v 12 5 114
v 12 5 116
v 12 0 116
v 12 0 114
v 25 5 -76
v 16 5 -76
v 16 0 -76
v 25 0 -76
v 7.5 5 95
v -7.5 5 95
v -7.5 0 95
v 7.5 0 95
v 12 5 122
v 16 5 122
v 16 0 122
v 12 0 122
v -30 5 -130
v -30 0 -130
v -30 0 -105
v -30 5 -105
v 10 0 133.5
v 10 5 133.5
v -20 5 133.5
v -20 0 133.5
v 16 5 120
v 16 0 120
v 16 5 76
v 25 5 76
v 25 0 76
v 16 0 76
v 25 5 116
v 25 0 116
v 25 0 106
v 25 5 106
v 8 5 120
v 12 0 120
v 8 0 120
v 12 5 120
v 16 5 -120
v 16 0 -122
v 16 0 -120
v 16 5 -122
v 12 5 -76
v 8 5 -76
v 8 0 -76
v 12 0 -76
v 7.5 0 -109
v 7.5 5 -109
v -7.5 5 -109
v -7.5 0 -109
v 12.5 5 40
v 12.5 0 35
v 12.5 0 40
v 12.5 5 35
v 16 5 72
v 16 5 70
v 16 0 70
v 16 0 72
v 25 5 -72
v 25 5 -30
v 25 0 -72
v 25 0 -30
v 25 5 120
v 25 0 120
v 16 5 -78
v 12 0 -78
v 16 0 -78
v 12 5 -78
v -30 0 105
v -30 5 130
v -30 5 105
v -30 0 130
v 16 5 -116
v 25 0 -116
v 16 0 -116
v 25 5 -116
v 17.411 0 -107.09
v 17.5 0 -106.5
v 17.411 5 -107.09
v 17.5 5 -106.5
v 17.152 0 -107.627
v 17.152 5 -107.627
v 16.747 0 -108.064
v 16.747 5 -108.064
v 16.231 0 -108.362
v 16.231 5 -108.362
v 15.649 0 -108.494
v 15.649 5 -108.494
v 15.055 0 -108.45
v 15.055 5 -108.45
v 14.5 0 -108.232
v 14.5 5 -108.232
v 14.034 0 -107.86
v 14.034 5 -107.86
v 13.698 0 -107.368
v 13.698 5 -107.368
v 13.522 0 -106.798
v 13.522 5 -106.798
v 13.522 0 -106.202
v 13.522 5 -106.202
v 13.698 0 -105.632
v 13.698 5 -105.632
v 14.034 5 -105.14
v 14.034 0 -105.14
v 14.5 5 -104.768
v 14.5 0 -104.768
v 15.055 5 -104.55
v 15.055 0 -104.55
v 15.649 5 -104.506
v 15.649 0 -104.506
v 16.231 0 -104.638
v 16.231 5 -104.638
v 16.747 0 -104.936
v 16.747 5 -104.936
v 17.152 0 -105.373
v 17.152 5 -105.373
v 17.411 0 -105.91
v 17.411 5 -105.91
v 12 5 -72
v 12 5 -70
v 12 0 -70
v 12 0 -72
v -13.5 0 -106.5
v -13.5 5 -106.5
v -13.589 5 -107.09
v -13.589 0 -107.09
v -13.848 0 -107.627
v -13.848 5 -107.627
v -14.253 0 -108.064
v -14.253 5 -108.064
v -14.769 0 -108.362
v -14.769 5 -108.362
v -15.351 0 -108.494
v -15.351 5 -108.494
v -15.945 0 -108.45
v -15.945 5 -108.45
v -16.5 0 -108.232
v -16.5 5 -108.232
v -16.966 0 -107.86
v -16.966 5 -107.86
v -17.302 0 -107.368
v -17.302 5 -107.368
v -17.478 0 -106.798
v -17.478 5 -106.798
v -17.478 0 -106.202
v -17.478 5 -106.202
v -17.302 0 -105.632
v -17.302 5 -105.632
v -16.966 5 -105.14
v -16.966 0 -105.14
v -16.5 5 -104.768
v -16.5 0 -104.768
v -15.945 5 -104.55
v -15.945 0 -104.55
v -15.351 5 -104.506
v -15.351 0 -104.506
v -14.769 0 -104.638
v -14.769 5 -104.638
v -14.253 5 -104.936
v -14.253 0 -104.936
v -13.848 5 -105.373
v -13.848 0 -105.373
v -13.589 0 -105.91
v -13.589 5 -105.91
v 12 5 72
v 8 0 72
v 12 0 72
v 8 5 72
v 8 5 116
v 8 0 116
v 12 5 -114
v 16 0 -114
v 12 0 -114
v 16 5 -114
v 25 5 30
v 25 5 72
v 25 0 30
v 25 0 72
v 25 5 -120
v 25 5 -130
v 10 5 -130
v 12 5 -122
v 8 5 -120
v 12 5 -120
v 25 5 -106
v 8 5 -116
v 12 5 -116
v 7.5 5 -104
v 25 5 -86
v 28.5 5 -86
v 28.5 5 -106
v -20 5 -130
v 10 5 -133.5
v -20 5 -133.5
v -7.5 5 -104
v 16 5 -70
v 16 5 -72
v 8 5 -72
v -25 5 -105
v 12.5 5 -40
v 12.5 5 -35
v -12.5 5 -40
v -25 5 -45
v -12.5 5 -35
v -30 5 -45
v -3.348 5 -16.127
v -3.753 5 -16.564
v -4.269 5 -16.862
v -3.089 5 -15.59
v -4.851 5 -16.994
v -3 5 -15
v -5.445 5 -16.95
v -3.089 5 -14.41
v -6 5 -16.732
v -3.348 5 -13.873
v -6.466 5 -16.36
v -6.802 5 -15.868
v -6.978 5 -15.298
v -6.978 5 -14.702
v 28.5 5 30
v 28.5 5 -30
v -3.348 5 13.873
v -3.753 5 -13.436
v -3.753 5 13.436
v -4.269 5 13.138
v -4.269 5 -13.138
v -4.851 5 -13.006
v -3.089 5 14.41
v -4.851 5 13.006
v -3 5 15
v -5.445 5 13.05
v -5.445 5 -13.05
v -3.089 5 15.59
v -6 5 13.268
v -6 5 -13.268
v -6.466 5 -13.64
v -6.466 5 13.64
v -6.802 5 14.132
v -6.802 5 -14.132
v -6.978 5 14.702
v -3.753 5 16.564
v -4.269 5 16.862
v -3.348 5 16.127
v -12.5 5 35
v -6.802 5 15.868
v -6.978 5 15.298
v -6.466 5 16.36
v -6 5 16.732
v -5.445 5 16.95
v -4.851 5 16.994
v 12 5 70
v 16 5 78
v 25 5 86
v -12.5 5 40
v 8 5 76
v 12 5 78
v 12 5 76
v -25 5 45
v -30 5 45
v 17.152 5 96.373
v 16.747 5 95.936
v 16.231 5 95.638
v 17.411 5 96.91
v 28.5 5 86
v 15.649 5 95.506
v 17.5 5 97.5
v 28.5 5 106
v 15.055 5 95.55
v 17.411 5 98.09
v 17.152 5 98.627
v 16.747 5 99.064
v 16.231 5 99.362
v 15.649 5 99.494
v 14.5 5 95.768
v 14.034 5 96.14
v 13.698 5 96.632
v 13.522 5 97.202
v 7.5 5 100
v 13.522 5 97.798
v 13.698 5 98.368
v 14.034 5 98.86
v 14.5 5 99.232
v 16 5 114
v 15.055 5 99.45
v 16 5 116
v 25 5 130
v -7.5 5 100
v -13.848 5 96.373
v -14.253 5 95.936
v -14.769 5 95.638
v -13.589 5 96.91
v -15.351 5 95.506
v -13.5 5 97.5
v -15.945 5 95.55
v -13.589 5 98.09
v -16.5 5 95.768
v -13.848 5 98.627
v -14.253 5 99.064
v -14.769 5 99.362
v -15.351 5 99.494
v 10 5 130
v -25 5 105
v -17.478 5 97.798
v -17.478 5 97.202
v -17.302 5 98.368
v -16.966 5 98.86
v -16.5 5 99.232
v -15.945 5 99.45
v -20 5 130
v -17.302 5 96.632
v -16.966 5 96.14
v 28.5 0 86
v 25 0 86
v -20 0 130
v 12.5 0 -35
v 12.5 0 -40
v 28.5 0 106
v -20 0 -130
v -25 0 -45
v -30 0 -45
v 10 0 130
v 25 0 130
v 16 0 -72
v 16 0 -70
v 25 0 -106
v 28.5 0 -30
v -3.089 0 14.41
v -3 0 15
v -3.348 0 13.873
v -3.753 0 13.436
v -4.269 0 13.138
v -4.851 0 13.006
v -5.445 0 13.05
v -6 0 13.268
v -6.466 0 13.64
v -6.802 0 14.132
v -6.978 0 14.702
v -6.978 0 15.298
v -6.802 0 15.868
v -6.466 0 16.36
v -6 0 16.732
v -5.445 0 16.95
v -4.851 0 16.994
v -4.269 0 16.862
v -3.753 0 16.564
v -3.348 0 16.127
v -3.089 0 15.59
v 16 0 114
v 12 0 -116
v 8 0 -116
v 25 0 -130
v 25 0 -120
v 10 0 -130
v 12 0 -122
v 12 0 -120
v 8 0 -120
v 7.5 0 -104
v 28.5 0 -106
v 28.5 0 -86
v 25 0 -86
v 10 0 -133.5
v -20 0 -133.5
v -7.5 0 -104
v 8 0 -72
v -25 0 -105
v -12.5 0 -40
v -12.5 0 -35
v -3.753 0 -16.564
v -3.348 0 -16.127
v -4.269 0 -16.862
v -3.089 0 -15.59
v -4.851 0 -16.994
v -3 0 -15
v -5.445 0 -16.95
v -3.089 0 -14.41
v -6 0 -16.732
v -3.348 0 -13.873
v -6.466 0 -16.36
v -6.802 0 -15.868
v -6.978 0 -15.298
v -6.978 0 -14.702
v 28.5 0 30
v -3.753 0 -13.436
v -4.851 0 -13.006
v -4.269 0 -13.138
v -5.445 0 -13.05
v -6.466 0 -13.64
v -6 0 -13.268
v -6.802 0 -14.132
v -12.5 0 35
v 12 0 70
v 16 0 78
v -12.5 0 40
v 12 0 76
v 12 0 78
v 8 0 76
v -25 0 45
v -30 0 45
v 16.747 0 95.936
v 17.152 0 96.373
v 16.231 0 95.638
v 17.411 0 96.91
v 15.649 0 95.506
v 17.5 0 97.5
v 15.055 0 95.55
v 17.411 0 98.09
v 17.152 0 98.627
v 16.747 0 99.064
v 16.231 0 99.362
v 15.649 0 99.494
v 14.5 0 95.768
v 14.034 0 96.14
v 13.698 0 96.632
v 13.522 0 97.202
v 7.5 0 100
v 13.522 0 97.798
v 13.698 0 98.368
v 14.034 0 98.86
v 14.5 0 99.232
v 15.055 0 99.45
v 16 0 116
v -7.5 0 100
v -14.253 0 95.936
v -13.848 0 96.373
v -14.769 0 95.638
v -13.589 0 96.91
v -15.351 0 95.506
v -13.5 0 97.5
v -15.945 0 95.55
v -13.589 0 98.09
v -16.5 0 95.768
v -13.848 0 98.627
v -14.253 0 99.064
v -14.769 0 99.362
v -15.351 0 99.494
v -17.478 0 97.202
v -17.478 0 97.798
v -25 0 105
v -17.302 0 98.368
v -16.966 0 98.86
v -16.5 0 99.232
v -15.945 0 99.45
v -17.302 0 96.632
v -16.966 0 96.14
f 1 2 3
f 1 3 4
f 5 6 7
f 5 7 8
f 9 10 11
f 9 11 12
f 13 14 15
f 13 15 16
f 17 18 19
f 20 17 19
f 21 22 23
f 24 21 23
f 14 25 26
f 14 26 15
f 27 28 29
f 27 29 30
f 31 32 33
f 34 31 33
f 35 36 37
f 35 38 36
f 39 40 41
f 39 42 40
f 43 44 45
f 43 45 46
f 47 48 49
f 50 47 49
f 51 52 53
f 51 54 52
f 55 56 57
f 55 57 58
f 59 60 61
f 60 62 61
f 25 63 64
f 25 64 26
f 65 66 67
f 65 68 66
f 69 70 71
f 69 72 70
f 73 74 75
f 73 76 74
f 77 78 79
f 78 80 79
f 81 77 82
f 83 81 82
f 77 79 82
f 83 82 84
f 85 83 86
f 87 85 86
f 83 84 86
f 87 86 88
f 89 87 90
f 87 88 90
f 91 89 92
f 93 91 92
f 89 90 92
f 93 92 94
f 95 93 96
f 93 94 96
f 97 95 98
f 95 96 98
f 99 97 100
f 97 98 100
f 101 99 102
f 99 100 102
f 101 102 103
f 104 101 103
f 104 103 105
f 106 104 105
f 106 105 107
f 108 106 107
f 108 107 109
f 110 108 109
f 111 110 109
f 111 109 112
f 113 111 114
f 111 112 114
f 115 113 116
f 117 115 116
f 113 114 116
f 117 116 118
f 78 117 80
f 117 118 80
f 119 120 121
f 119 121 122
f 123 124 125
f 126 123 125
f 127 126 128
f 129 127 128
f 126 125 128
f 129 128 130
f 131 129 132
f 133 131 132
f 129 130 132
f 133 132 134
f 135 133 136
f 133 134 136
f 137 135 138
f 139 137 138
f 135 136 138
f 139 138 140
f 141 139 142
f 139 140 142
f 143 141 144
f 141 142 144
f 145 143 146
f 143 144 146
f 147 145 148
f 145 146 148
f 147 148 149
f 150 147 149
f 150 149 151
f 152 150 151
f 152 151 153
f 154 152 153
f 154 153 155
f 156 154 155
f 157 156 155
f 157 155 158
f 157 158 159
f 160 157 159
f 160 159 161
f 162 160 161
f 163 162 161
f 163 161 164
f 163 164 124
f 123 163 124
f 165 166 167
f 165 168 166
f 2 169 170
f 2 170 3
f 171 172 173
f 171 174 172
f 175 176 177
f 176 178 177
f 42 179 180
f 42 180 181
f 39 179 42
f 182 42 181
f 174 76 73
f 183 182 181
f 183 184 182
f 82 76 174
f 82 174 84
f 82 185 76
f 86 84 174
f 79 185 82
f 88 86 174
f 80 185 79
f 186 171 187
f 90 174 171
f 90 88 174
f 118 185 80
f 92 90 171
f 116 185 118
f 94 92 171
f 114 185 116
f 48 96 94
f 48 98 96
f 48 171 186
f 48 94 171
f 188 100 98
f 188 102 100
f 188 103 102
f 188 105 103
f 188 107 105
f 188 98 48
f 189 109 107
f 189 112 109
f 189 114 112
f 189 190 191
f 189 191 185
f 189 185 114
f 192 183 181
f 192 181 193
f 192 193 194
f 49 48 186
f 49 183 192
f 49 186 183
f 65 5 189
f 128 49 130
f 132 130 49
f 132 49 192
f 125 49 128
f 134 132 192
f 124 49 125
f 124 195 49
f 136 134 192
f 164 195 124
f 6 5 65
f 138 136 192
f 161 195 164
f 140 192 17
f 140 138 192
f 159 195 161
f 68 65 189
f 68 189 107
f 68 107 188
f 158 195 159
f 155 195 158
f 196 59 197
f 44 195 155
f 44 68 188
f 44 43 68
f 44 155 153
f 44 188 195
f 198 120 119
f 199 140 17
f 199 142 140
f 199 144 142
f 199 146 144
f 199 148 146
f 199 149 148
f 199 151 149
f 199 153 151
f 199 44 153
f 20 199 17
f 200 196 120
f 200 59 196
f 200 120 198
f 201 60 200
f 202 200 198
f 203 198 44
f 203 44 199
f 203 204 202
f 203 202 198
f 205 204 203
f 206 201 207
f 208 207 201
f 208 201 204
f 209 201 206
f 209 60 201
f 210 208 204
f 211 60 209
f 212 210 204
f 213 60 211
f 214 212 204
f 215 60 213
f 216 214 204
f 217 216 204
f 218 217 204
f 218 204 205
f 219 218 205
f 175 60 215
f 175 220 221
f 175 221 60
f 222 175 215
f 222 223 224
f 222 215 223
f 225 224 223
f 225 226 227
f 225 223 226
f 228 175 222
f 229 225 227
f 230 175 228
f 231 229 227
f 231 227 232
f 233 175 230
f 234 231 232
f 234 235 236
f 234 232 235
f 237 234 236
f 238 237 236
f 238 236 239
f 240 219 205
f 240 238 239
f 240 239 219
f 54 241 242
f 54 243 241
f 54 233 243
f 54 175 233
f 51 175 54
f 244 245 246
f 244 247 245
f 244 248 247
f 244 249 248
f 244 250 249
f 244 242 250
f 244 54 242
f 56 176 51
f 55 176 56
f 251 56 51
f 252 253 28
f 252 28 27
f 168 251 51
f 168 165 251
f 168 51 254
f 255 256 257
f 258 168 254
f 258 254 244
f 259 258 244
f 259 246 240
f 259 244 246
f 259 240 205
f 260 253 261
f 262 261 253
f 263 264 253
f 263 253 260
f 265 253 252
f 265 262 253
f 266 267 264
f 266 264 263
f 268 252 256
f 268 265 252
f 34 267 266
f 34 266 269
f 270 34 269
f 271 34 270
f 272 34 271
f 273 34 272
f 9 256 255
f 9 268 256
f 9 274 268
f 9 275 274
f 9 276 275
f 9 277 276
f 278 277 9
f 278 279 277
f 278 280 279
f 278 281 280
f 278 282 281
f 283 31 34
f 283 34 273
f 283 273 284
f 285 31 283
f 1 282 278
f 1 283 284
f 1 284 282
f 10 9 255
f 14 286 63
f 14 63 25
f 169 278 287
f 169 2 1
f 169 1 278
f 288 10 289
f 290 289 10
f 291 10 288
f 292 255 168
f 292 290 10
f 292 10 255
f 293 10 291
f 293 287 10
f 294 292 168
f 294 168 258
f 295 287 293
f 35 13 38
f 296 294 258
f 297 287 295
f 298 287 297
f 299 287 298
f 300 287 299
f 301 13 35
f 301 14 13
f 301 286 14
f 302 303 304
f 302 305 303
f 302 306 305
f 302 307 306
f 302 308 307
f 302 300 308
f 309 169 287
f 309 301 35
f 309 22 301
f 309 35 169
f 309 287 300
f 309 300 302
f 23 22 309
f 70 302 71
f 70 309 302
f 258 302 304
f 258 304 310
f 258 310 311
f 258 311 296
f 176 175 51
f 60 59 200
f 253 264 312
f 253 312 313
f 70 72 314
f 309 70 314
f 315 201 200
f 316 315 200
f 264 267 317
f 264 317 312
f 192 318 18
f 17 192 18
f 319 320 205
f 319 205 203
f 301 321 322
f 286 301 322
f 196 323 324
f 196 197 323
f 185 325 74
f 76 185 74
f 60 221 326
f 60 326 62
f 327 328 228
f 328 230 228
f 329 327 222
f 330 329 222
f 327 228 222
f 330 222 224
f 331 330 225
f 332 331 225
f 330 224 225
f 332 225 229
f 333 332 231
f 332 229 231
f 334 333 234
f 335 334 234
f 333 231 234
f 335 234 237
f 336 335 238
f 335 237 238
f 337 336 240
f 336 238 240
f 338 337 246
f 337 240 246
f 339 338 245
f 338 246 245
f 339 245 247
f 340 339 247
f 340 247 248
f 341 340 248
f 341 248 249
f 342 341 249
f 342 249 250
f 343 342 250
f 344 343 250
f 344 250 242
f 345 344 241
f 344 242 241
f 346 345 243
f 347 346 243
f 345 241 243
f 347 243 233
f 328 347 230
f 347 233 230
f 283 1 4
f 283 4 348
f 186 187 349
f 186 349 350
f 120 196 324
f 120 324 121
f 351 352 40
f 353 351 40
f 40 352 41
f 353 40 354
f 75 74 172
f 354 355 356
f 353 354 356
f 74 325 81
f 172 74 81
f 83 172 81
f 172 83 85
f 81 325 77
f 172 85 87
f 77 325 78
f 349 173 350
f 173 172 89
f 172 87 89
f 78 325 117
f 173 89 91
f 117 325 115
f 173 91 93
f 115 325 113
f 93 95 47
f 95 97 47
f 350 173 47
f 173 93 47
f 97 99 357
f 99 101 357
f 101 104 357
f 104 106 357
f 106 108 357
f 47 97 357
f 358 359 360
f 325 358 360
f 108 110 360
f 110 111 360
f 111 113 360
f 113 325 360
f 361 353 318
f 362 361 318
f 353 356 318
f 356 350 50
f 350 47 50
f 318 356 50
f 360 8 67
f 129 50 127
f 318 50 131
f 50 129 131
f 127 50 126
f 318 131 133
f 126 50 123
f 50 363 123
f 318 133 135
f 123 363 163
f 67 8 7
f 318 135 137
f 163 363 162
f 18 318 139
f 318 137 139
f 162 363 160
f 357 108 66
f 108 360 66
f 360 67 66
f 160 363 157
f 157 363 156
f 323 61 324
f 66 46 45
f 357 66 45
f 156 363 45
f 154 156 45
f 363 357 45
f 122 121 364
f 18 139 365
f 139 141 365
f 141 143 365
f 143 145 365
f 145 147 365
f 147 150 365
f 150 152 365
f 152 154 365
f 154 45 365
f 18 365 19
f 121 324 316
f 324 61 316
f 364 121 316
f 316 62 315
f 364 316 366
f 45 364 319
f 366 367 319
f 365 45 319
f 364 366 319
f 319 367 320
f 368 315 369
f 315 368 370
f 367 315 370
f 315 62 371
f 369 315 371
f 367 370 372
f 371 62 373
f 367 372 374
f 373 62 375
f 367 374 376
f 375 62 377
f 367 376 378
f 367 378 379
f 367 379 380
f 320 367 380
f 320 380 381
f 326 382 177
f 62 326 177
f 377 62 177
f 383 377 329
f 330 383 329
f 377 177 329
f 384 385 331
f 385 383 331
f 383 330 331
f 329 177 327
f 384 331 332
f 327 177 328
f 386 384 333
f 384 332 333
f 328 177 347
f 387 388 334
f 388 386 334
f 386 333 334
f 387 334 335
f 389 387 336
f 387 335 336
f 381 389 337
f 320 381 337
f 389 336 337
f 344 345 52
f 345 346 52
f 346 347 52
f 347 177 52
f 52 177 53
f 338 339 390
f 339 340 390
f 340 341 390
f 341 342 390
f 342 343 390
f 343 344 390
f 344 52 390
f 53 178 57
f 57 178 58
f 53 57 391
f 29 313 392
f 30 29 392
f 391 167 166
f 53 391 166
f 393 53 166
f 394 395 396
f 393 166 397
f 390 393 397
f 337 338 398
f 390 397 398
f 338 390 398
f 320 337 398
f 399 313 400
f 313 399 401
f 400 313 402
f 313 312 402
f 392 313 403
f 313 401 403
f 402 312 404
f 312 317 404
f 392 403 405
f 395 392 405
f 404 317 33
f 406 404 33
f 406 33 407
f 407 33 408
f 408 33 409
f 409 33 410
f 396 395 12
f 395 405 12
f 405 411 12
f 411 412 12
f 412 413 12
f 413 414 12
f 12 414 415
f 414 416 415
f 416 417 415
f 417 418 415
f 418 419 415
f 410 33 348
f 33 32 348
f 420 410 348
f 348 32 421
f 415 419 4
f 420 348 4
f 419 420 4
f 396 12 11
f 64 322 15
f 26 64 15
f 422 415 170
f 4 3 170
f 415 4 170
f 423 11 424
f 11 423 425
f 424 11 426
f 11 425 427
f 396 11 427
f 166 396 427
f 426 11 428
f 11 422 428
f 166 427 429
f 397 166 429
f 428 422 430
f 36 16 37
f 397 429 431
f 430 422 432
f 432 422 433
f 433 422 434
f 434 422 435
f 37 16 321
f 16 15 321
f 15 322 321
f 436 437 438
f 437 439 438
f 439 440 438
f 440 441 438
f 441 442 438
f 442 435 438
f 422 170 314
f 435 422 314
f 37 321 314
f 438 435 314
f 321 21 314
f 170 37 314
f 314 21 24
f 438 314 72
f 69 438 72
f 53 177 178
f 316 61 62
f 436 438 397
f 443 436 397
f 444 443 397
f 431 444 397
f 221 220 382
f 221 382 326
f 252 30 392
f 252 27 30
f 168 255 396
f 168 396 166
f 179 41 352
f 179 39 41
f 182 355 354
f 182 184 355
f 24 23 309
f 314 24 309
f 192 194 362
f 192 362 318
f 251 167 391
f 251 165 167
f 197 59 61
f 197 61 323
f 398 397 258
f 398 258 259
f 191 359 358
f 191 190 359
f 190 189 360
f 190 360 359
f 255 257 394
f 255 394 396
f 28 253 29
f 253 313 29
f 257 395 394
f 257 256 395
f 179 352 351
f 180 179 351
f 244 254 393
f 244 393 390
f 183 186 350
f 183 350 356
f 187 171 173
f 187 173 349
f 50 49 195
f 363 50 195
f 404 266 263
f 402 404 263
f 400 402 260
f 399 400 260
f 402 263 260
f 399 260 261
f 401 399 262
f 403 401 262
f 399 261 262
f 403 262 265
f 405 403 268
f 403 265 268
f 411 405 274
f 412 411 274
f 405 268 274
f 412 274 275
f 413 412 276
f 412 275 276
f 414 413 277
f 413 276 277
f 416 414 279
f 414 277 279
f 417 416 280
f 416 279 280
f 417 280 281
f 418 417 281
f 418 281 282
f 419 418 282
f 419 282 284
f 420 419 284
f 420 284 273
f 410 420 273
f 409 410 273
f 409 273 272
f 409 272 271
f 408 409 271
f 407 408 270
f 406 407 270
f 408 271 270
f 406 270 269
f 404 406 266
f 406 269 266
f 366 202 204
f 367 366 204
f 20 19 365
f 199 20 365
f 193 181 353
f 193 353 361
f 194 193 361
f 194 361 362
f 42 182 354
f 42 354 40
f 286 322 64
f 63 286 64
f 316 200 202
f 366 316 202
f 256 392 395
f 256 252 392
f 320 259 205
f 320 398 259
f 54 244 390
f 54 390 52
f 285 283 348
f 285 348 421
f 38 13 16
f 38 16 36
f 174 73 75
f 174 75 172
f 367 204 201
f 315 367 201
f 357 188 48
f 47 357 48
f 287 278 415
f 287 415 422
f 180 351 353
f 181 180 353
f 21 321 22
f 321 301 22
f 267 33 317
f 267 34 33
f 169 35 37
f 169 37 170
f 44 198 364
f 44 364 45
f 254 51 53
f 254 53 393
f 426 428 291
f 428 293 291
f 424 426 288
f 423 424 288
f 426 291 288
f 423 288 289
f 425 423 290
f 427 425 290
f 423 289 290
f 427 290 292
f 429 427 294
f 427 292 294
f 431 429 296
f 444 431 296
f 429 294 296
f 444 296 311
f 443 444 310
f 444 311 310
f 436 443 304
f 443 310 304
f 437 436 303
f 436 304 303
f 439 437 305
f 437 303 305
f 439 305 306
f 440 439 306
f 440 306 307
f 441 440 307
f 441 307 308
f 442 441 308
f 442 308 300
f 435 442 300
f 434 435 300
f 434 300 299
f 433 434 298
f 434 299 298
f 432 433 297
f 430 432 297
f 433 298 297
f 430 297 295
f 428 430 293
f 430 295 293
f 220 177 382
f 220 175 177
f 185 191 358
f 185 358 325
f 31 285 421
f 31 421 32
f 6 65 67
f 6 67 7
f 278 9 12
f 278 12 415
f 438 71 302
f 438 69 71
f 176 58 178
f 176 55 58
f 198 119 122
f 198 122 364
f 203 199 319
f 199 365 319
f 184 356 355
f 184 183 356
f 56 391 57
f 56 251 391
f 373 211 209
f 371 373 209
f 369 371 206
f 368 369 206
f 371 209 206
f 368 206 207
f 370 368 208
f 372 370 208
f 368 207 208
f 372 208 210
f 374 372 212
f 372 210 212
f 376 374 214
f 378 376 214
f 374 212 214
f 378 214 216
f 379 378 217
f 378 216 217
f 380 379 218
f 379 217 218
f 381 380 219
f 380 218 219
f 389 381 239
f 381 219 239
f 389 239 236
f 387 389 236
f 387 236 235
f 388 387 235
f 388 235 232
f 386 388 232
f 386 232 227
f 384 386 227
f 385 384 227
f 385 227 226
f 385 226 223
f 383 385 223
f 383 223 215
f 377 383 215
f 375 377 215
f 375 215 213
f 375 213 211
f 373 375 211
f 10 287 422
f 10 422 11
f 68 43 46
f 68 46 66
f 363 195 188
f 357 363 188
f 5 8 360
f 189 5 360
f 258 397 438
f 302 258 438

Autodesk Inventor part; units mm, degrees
ref_plane "YZ Plane" through (0, 0, 0) normal (1, 0, 0) x (0, 1, 0)
ref_plane "XZ Plane" through (0, 0, 0) normal (0, 1, 0) x (-1, 0, 0)
ref_plane "XY Plane" through (0, 0, 0) normal (0, 0, 1) x (1, 0, 0)
sketch "Sketch1" plane through (0, 0, 0) normal (0, 1, 0) x (-1, 0, 0)
  line L0 (-25, -130) -> (25, -130)
  line L1 (25, 130) -> (-25, 130)
  line L2 (-25, 130) -> (-25, -130)
  line L3 (-25, -130) -> (25, 130) construction
  line L4 (25, -130) -> (-25, 130) construction
  line L5 (25, 130) -> (30, 130)
  line L6 (30, 130) -> (30, 105)
  line L7 (30, 105) -> (25, 105)
  line L8 (25, -130) -> (30, -130)
  line L9 (30, -130) -> (30, -105)
  line L10 (30, -105) -> (25, -105)
  line L11 (25, 105) -> (-25, 105) construction
  line L12 (3.2055, 0) -> (-25, 0) construction
  line L13 (25, -105) -> (-25, -105) construction
  line L14 (25, 45) -> (30, 45)
  line L15 (30, 45) -> (30, -45)
  line L16 (30, -45) -> (25, -45)
  line L17 (25, -105) -> (25, -45)
  line L18 (25, 45) -> (25, 105)
  point P0 (0, 0)
  dimension "d0" = 50
  dimension "d1" = 260
  dimension "d2" = 5
  dimension "d3" = 25
  dimension "d4" = 5
  dimension "d5" = 25
  dimension "d7" = 5
  dimension "d8" = 90
  dimension "d29" = 60
  dimension "d30" = 60
extrude "Extrusion1" add sketch "Sketch1" along normal blind 5
sketch "Sketch2" plane through (0, 5, 0) normal (0, 1, 0) x (1, 0, 0)
  line L0 (25, 130) -> (-30, 130) construction
  line L1 (-30, 130) -> (-30, 105) construction
  line L2 (-30, 105) -> (-25, 105) construction
  line L3 (-25, 105) -> (-25, 45) construction
  line L4 (-25, 45) -> (-30, 45) construction
  line L5 (-30, 45) -> (-30, -45) construction
  line L6 (-30, -45) -> (-25, -45) construction
  line L7 (-25, -45) -> (-25, -105) construction
  line L8 (-25, -105) -> (-30, -105) construction
  line L9 (-30, -105) -> (-30, -130) construction
  line L10 (-30, -130) -> (25, -130) construction
  line L11 (25, -130) -> (25, 130) construction
  line L12 (-30, 45) -> (-30, -45) construction
  line L13 (25, -130) -> (25, 130) construction
  line L14 (7.5, -100) -> (-7.5, -100)
  line L15 (-7.5, -100) -> (-7.5, -95)
  line L16 (-7.5, -95) -> (7.5, -95)
  line L17 (7.5, -95) -> (7.5, -100)
  line L18 (7.5, 109) -> (-7.5, 109)
  line L19 (-7.5, 109) -> (-7.5, 104)
  line L20 (-7.5, 104) -> (7.5, 104)
  line L21 (7.5, 104) -> (7.5, 109)
  line L22 (-7.5, 106.5) -> (25, 106.5) construction
  line L23 (-7.5, 106.5) -> (-30, 106.5) construction
  circle A0 centre (-15.5, 106.5) radius 2
  circle A1 centre (15.5, 106.5) radius 2
  line L24 (-7.5, -97.5) -> (25, -97.5) construction
  line L25 (-7.5, -97.5) -> (-25, -97.5) construction
  circle A2 centre (-15.5, -97.5) radius 2
  circle A3 centre (15.5, -97.5) radius 2
  point P0 (0, 0)
  dimension "d11" = 15
  dimension "d12" = 5
  dimension "d13" = 35
  dimension "d14" = 17.5
  dimension "d17" = 5
  dimension "d18" = 15
  dimension "d19" = 26
  dimension "d31" = 17.5
  dimension "d32" = 4
  dimension "d33" = 4
  dimension "d34" = 8
  dimension "d35" = 8
  dimension "d36" = 4
  dimension "d37" = 4
  dimension "d38" = 8
  dimension "d39" = 8
extrude "Extrusion2" cut sketch "Sketch2" against normal blind 5
sketch "Sketch3" plane through (0, 5, 0) normal (0, 1, 0) x (1, 0, 0)
  line L0 (7.5, -95) -> (7.5, -100) construction
  line L1 (7.5, -100) -> (-7.5, -100) construction
  line L2 (-7.5, -100) -> (-7.5, -95) construction
  line L3 (-7.5, -95) -> (7.5, -95) construction
  line L4 (7.5, 104) -> (-7.5, 104) construction
  line L5 (-7.5, 104) -> (-7.5, 109) construction
  line L6 (-7.5, 109) -> (7.5, 109) construction
  line L7 (7.5, 109) -> (7.5, 104) construction
  line L8 (25, 130) -> (-30, 130) construction
  line L9 (-30, 130) -> (-30, 105) construction
  line L10 (-30, 105) -> (-25, 105) construction
  line L11 (-25, 105) -> (-25, 45) construction
  line L12 (-25, 45) -> (-30, 45) construction
  line L13 (-30, 45) -> (-30, -45) construction
  line L14 (-30, -45) -> (-25, -45) construction
  line L15 (-25, -45) -> (-25, -105) construction
  line L16 (-25, -105) -> (-30, -105) construction
  line L17 (-30, -105) -> (-30, -130) construction
  line L18 (-30, -130) -> (25, -130) construction
  line L19 (25, -130) -> (25, 130) construction
  circle A0 centre (-5, 15) radius 2
  circle A1 centre (-5, -15) radius 2
  line L20 (-30, 45) -> (-30, -45) construction
  line L21 (-30, 0) -> (25, 0) construction
  point P0 (0, 0)
  dimension "d20" = 4
  dimension "d21" = 4
  dimension "d23" = 15
  dimension "d24" = 15
  dimension "d25" = 25
  dimension "d26" = 25
extrude "Extrusion3" cut sketch "Sketch3" against normal blind 5
sketch "Sketch4" plane through (0, 5, 0) normal (0, 1, 0) x (1, 0, 0)
  circle A0 centre (-5, 15) radius 2 construction
  circle A1 centre (-5, -15) radius 2 construction
  line L0 (7.5, -95) -> (7.5, -100) construction
  line L1 (7.5, -100) -> (-7.5, -100) construction
  line L2 (-7.5, -100) -> (-7.5, -95) construction
  line L3 (-7.5, -95) -> (7.5, -95) construction
  circle A2 centre (-15.5, -97.5) radius 2 construction
  circle A3 centre (-15.5, 106.5) radius 2 construction
  circle A4 centre (15.5, 106.5) radius 2 construction
  circle A5 centre (15.5, -97.5) radius 2 construction
  line L4 (7.5, 104) -> (-7.5, 104) construction
  line L5 (-7.5, 104) -> (-7.5, 109) construction
  line L6 (-7.5, 109) -> (7.5, 109) construction
  line L7 (7.5, 109) -> (7.5, 104) construction
  line L8 (25, 130) -> (-30, 130) construction
  line L9 (-30, 130) -> (-30, 105) construction
  line L10 (-30, 105) -> (-25, 105) construction
  line L11 (-25, 105) -> (-25, 45) construction
  line L12 (-25, 45) -> (-30, 45) construction
  line L13 (-30, 45) -> (-30, -45) construction
  line L14 (-30, -45) -> (-25, -45) construction
  line L15 (-25, -45) -> (-25, -105) construction
  line L16 (-25, -105) -> (-30, -105) construction
  line L17 (-30, -105) -> (-30, -130) construction
  line L18 (-30, -130) -> (25, -130) construction
  line L19 (25, -130) -> (25, 130) construction
  line L20 (0, 0) -> (0, -130) construction
  line L21 (-30, -130) -> (25, -130) construction
  line L22 (0, 0) -> (0, 130) construction
  line L23 (25, 130) -> (-30, 130) construction
  line L24 (25, 0) -> (-30, 0) construction
  line L25 (-30, 45) -> (-30, -45) construction
  line L26 (12.5, 40) -> (-12.5, 40)
  line L27 (-12.5, 40) -> (-12.5, 35)
  line L28 (-12.5, 35) -> (12.5, 35)
  line L29 (12.5, 35) -> (12.5, 40)
  line L30 (12.5, 40) -> (-12.5, 35) construction
  line L31 (-12.5, 40) -> (12.5, 35) construction
  line L32 (12.5, -40) -> (-12.5, -40)
  line L33 (-12.5, -40) -> (-12.5, -35)
  line L34 (-12.5, -35) -> (12.5, -35)
  line L35 (12.5, -35) -> (12.5, -40)
  line L36 (12.5, -40) -> (-12.5, -35) construction
  line L37 (-12.5, -40) -> (12.5, -35) construction
  point P0 (0, 37.5)
  point P1 (0, -37.5)
  dimension "d42" = 25
  dimension "d43" = 5
  dimension "d44" = 90
extrude "Extrusion4" cut sketch "Sketch4" against normal blind 10
sketch "Sketch5" plane through (0, 5, 0) normal (0, 1, 0) x (1, 0, 0)
  line L0 (-12.5, 35) -> (-12.5, 40) construction
  line L1 (-12.5, 40) -> (12.5, 40) construction
  line L2 (12.5, 40) -> (12.5, 35) construction
  line L3 (12.5, 35) -> (-12.5, 35) construction
  line L4 (12.5, -40) -> (-12.5, -40) construction
  line L5 (-12.5, -40) -> (-12.5, -35) construction
  line L6 (-12.5, -35) -> (12.5, -35) construction
  line L7 (12.5, -35) -> (12.5, -40) construction
  circle A0 centre (-5, 15) radius 2 construction
  circle A1 centre (-5, -15) radius 2 construction
  line L8 (7.5, -95) -> (7.5, -100) construction
  line L9 (7.5, -100) -> (-7.5, -100) construction
  line L10 (-7.5, -100) -> (-7.5, -95) construction
  line L11 (-7.5, -95) -> (7.5, -95) construction
  circle A2 centre (-15.5, -97.5) radius 2 construction
  circle A3 centre (-15.5, 106.5) radius 2 construction
  circle A4 centre (15.5, 106.5) radius 2 construction
  circle A5 centre (15.5, -97.5) radius 2 construction
  line L12 (7.5, 104) -> (-7.5, 104) construction
  line L13 (-7.5, 104) -> (-7.5, 109) construction
  line L14 (-7.5, 109) -> (7.5, 109) construction
  line L15 (7.5, 109) -> (7.5, 104) construction
  line L16 (25, 130) -> (-30, 130) construction
  line L17 (-30, 130) -> (-30, 105) construction
  line L18 (-30, 105) -> (-25, 105) construction
  line L19 (-25, 105) -> (-25, 45) construction
  line L20 (-25, 45) -> (-30, 45) construction
  line L21 (-30, 45) -> (-30, -45) construction
  line L22 (-30, -45) -> (-25, -45) construction
  line L23 (-25, -45) -> (-25, -105) construction
  line L24 (-25, -105) -> (-30, -105) construction
  line L25 (-30, -105) -> (-30, -130) construction
  line L26 (-30, -130) -> (25, -130) construction
  line L27 (25, -130) -> (25, 130) construction
  line L28 (0, -40) -> (0, -45) construction
  line L29 (0, -45) -> (-20, -45) construction
  line L30 (-20, -45) -> (-20, -40) construction
  line L31 (-20, -40) -> (0, -40) construction
  line L32 (0, 45) -> (0, 40) construction
  line L33 (0, 40) -> (-20, 40) construction
  line L34 (-20, 40) -> (-20, 45) construction
  line L35 (-20, 45) -> (0, 45) construction
  circle A6 centre (-30.5, 97.5) radius 2 construction
  circle A7 centre (-30.5, -106.5) radius 2 construction
  circle A8 centre (10.5, -106.5) radius 2 construction
  circle A9 centre (10.5, 97.5) radius 2 construction
  line L36 (-22.5, 95) -> (-22.5, 100) construction
  line L37 (-22.5, 100) -> (2.5, 100) construction
  line L38 (2.5, 100) -> (2.5, 95) construction
  line L39 (2.5, 95) -> (-22.5, 95) construction
  line L40 (2.5, -109) -> (-22.5, -109) construction
  line L41 (-22.5, -109) -> (-22.5, -104) construction
  line L42 (-22.5, -104) -> (2.5, -104) construction
  line L43 (2.5, -104) -> (2.5, -109) construction
  line L44 (-50, -130) -> (25, -130) construction
  line L45 (25, -130) -> (25, 130) construction
  line L46 (25, 130) -> (-50, 130) construction
  line L47 (-50, 130) -> (-50, 105) construction
  line L48 (-50, 105) -> (-45, 105) construction
  line L49 (-45, 105) -> (-45, 45) construction
  line L50 (-45, 45) -> (-50, 45) construction
  line L51 (-50, 45) -> (-50, -45) construction
  line L52 (-50, -45) -> (-45, -45) construction
  line L53 (-45, -45) -> (-45, -105) construction
  line L54 (-45, -105) -> (-50, -105) construction
  line L55 (-50, -105) -> (-50, -130) construction
  line L56 (25, -130) -> (25, 130) construction
  line L57 (25, -120) -> (10, -120) construction
  line L58 (10, -120) -> (10, -116) construction
  line L59 (10, -116) -> (25, -116) construction
  line L60 (25, -116) -> (25, -120) construction
  line L61 (10, -118) -> (25, -118) construction
  line L62 (18, -114) -> (14, -114) construction
  line L63 (14, -114) -> (14, -122) construction
  line L64 (14, -122) -> (18, -122) construction
  line L65 (18, -122) -> (18, -114) construction
  line L66 (18, -114) -> (14, -122) construction
  line L67 (14, -114) -> (18, -122) construction
  line L68 (25, -116) -> (25, -120)
  line L69 (25, -120) -> (18, -120)
  line L70 (18, -120) -> (18, -122)
  line L71 (18, -122) -> (14, -122)
  line L72 (14, -122) -> (14, -120)
  line L73 (14, -120) -> (10, -120)
  line L74 (10, -120) -> (10, -116)
  line L75 (10, -116) -> (14, -116)
  line L76 (14, -116) -> (14, -114)
  line L77 (14, -114) -> (18, -114)
  line L78 (18, -114) -> (18, -116)
  line L79 (18, -116) -> (25, -116)
  line L80 (18, -70) -> (14, -70) construction
  line L81 (14, -70) -> (18, -70)
  line L82 (18, -70) -> (18, -72)
  line L83 (10, -72) -> (25, -72) construction
  line L84 (10, -74) -> (25, -74) construction
  line L85 (25, -76) -> (10, -76) construction
  line L86 (18, -78) -> (18, -70) construction
  line L87 (18, -70) -> (14, -78) construction
  line L88 (14, -70) -> (18, -78) construction
  line L89 (14, -70) -> (14, -78) construction
  line L90 (14, -78) -> (18, -78) construction
  line L91 (18, -78) -> (14, -78)
  line L92 (18, -76) -> (18, -78)
  line L93 (25, -76) -> (18, -76)
  line L94 (25, -72) -> (25, -76) construction
  line L95 (25, -72) -> (25, -76)
  line L96 (18, -72) -> (25, -72)
  line L97 (10, -76) -> (10, -72) construction
  line L98 (14, -78) -> (14, -76)
  line L99 (14, -72) -> (14, -70)
  line L100 (10, -72) -> (14, -72)
  line L101 (14, -76) -> (10, -76)
  line L102 (10, -76) -> (10, -72)
  line L103 (25, -106) -> (28.5, -106)
  line L104 (28.5, -106) -> (28.5, -86)
  line L105 (28.5, -86) -> (25, -86)
  line L106 (25, -86) -> (25, -106)
  line L107 (25, 106) -> (25, 86)
  line L108 (28.5, 106) -> (25, 106)
  line L109 (28.5, 86) -> (28.5, 106)
  line L110 (25, 86) -> (28.5, 86)
  line L111 (10, 72) -> (10, 76) construction
  line L112 (10, 72) -> (10, 76)
  line L113 (14, 76) -> (14, 78)
  line L114 (10, 76) -> (14, 76)
  line L115 (14, 72) -> (10, 72)
  line L116 (14, 70) -> (14, 72)
  line L117 (14, 78) -> (14, 70) construction
  line L118 (18, 72) -> (18, 70)
  line L119 (18, 70) -> (18, 78) construction
  line L120 (18, 70) -> (14, 70)
  line L121 (18, 78) -> (14, 70) construction
  line L122 (14, 78) -> (18, 70) construction
  line L123 (14, 70) -> (18, 70) construction
  line L124 (18, 78) -> (18, 76)
  line L125 (18, 78) -> (14, 78) construction
  line L126 (10, 76) -> (25, 76) construction
  line L127 (10, 74) -> (25, 74) construction
  line L128 (25, 72) -> (10, 72) construction
  line L129 (14, 78) -> (18, 78)
  line L130 (18, 122) -> (14, 122) construction
  line L131 (14, 122) -> (18, 122)
  line L132 (18, 122) -> (18, 120)
  line L133 (10, 118) -> (25, 118) construction
  line L134 (25, 116) -> (10, 116) construction
  line L135 (10, 120) -> (25, 120) construction
  line L136 (14, 114) -> (18, 114) construction
  line L137 (18, 114) -> (14, 114)
  line L138 (14, 114) -> (14, 116)
  line L139 (14, 116) -> (10, 116)
  line L140 (10, 120) -> (14, 120)
  line L141 (10, 116) -> (10, 120)
  line L142 (10, 116) -> (10, 120) construction
  line L143 (18, 114) -> (18, 122) construction
  line L144 (18, 122) -> (14, 114) construction
  line L145 (14, 122) -> (14, 114) construction
  line L146 (14, 120) -> (14, 122)
  line L147 (14, 122) -> (18, 114) construction
  line L148 (18, 76) -> (25, 76)
  line L149 (25, 76) -> (25, 72) construction
  line L150 (25, 76) -> (25, 72)
  line L151 (25, 72) -> (18, 72)
  line L152 (25, 120) -> (25, 116) construction
  line L153 (25, 120) -> (25, 116)
  line L154 (18, 120) -> (25, 120)
  line L155 (25, 116) -> (18, 116)
  line L156 (18, 116) -> (18, 114)
  line L157 (25, -30) -> (28.5, -30)
  line L158 (28.5, -30) -> (28.5, 30)
  line L159 (28.5, 30) -> (25, 30)
  line L160 (25, 30) -> (25, -30)
  line L161 (25, -130) -> (25, 130)
  point P0 (0, 0)
  point P1 (0, 0)
  point P2 (16, -118)
  point P3 (16, -74)
  point P4 (16, 74)
  point P5 (16, 118)
  dimension "d47" = 15
  dimension "d48" = 4
  dimension "d49" = 4
  dimension "d50" = 8
  dimension "d51" = 4
  dimension "d52" = 10
  dimension "d53" = 15
  dimension "d54" = 4
  dimension "d55" = 4
  dimension "d56" = 8
  dimension "d57" = 4
  dimension "d58" = 40
  dimension "d59" = 3.5
  dimension "d60" = 20
  dimension "d61" = 10
  dimension "d62" = 15
  dimension "d63" = 4
  dimension "d64" = 4
  dimension "d65" = 8
  dimension "d66" = 4
  dimension "d67" = 15
  dimension "d68" = 4
  dimension "d69" = 4
  dimension "d70" = 8
  dimension "d71" = 4
  dimension "d72" = 40
  dimension "d73" = 3.5
  dimension "d74" = 20
  dimension "d75" = 10
  dimension "d76" = 10
  dimension "d77" = 3.5
  dimension "d78" = 60
  dimension "d79" = 30
extrude "Extrusion5" add sketch "Sketch5" against normal blind 5 contours L107 L108 L109 L110 | L160 L159 L158 L157 | L106 L105 L104 L103
sketch "Sketch6" plane through (0, 5, 0) normal (0, 1, 0) x (1, 0, 0)
  line L0 (-12.5, 35) -> (-12.5, 40) construction
  line L1 (-12.5, 40) -> (12.5, 40) construction
  line L2 (12.5, 40) -> (12.5, 35) construction
  line L3 (12.5, 35) -> (-12.5, 35) construction
  line L4 (12.5, -40) -> (-12.5, -40) construction
  line L5 (-12.5, -40) -> (-12.5, -35) construction
  line L6 (-12.5, -35) -> (12.5, -35) construction
  line L7 (12.5, -35) -> (12.5, -40) construction
  circle A0 centre (-5, 15) radius 2 construction
  circle A1 centre (-5, -15) radius 2 construction
  line L8 (7.5, -95) -> (7.5, -100) construction
  line L9 (7.5, -100) -> (-7.5, -100) construction
  line L10 (-7.5, -100) -> (-7.5, -95) construction
  line L11 (-7.5, -95) -> (7.5, -95) construction
  circle A2 centre (-15.5, -97.5) radius 2 construction
  circle A3 centre (-15.5, 106.5) radius 2 construction
  circle A4 centre (15.5, 106.5) radius 2 construction
  circle A5 centre (15.5, -97.5) radius 2 construction
  line L12 (7.5, 104) -> (-7.5, 104) construction
  line L13 (-7.5, 104) -> (-7.5, 109) construction
  line L14 (-7.5, 109) -> (7.5, 109) construction
  line L15 (7.5, 109) -> (7.5, 104) construction
  line L16 (25, 130) -> (-30, 130) construction
  line L17 (-30, 130) -> (-30, 105) construction
  line L18 (-30, 105) -> (-25, 105) construction
  line L19 (-25, 105) -> (-25, 45) construction
  line L20 (-25, 45) -> (-30, 45) construction
  line L21 (-30, 45) -> (-30, -45) construction
  line L22 (-30, -45) -> (-25, -45) construction
  line L23 (-25, -45) -> (-25, -105) construction
  line L24 (-25, -105) -> (-30, -105) construction
  line L25 (-30, -105) -> (-30, -130) construction
  line L26 (-30, -130) -> (25, -130) construction
  line L27 (25, -130) -> (25, -106) construction
  line L28 (25, -106) -> (28.5, -106) construction
  line L29 (28.5, -106) -> (28.5, -86) construction
  line L30 (28.5, -86) -> (25, -86) construction
  line L31 (25, -86) -> (25, -30) construction
  line L32 (25, -30) -> (28.5, -30) construction
  line L33 (28.5, -30) -> (28.5, 30) construction
  line L34 (28.5, 30) -> (25, 30) construction
  line L35 (25, 30) -> (25, 86) construction
  line L36 (28.5, 86) -> (25, 86) construction
  line L37 (28.5, 106) -> (28.5, 86) construction
  line L38 (25, 106) -> (28.5, 106) construction
  line L39 (25, 106) -> (25, 130) construction
  line L40 (0, -40) -> (0, -45) construction
  line L41 (0, -45) -> (-20, -45) construction
  line L42 (-20, -45) -> (-20, -40) construction
  line L43 (-20, -40) -> (0, -40) construction
  line L44 (0, 45) -> (0, 40) construction
  line L45 (0, 40) -> (-20, 40) construction
  line L46 (-20, 40) -> (-20, 45) construction
  line L47 (-20, 45) -> (0, 45) construction
  circle A6 centre (-30.5, 97.5) radius 2 construction
  circle A7 centre (-30.5, -106.5) radius 2 construction
  circle A8 centre (10.5, -106.5) radius 2 construction
  circle A9 centre (10.5, 97.5) radius 2 construction
  line L48 (-22.5, 95) -> (-22.5, 100) construction
  line L49 (-22.5, 100) -> (2.5, 100) construction
  line L50 (2.5, 100) -> (2.5, 95) construction
  line L51 (2.5, 95) -> (-22.5, 95) construction
  line L52 (2.5, -109) -> (-22.5, -109) construction
  line L53 (-22.5, -109) -> (-22.5, -104) construction
  line L54 (-22.5, -104) -> (2.5, -104) construction
  line L55 (2.5, -104) -> (2.5, -109) construction
  line L56 (-50, -130) -> (25, -130) construction
  line L57 (25, -130) -> (25, -106) construction
  line L58 (25, -106) -> (30.5, -106) construction
  line L59 (30.5, -106) -> (30.5, -86) construction
  line L60 (30.5, -86) -> (23, -86) construction
  line L61 (23, -86) -> (23, -30) construction
  line L62 (23, -30) -> (26.5, -30) construction
  line L63 (26.5, -30) -> (26.5, 30) construction
  line L64 (26.5, 30) -> (23, 30) construction
  line L65 (23, 30) -> (23, 86) construction
  line L66 (26.5, 86) -> (23, 86) construction
  line L67 (26.5, 106) -> (26.5, 86) construction
  line L68 (23, 106) -> (26.5, 106) construction
  line L69 (23, 106) -> (23, 130) construction
  line L70 (23, 130) -> (-50, 130) construction
  line L71 (-50, 130) -> (-50, 105) construction
  line L72 (-50, 105) -> (-45, 105) construction
  line L73 (-45, 105) -> (-45, 45) construction
  line L74 (-45, 45) -> (-50, 45) construction
  line L75 (-50, 45) -> (-50, -45) construction
  line L76 (-50, -45) -> (-45, -45) construction
  line L77 (-45, -45) -> (-45, -105) construction
  line L78 (-45, -105) -> (-50, -105) construction
  line L79 (-50, -105) -> (-50, -130) construction
  line L80 (25, -130) -> (25, -106) construction
  line L81 (25, -120) -> (8, -120) construction
  line L82 (8, -120) -> (8, -116) construction
  line L83 (8, -116) -> (25, -116) construction
  line L84 (25, -116) -> (25, -120) construction
  line L85 (8, -118) -> (25, -118) construction
  line L86 (16, -122) -> (12, -122) construction
  line L87 (12, -122) -> (12, -114) construction
  line L88 (12, -114) -> (16, -114) construction
  line L89 (16, -114) -> (16, -122) construction
  line L90 (16, -122) -> (12, -114) construction
  line L91 (12, -122) -> (16, -114) construction
  line L92 (25, -120) -> (16, -120)
  line L93 (16, -120) -> (16, -122)
  line L94 (16, -122) -> (12, -122)
  line L95 (12, -122) -> (12, -120)
  line L96 (12, -120) -> (8, -120)
  line L97 (8, -120) -> (8, -116)
  line L98 (8, -116) -> (12, -116)
  line L99 (12, -116) -> (12, -114)
  line L100 (12, -114) -> (16, -114)
  line L101 (16, -114) -> (16, -116)
  line L102 (16, -116) -> (25, -116)
  line L103 (25, -120) -> (25, -116)
  line L104 (16, -76) -> (16, -78)
  line L105 (16, -78) -> (12, -78)
  line L106 (12, -78) -> (12, -76)
  line L107 (16, -78) -> (12, -78) construction
  line L108 (16, -70) -> (16, -72)
  line L109 (25, -76) -> (16, -76)
  line L110 (12, -70) -> (16, -70) construction
  line L111 (12, -70) -> (16, -70)
  line L112 (12, -72) -> (12, -70)
  line L113 (16, -70) -> (16, -78) construction
  line L114 (12, -76) -> (8, -76)
  line L115 (12, -78) -> (16, -70) construction
  line L116 (12, -78) -> (12, -70) construction
  line L117 (16, -78) -> (12, -70) construction
  line L118 (8, -72) -> (12, -72)
  line L119 (8, -76) -> (8, -72)
  line L120 (25, -76) -> (8, -76) construction
  line L121 (8, -72) -> (25, -72) construction
  line L122 (8, -74) -> (25, -74) construction
  line L123 (16, -72) -> (25, -72)
  line L124 (25, -76) -> (25, -72)
  line L125 (25, -72) -> (25, -76) construction
  line L126 (8, -76) -> (8, -72) construction
  line L127 (16, 72) -> (16, 70)
  line L128 (16, 70) -> (12, 70)
  line L129 (12, 70) -> (12, 72)
  line L130 (16, 70) -> (12, 70) construction
  line L131 (16, 78) -> (16, 76)
  line L132 (25, 72) -> (16, 72)
  line L133 (12, 78) -> (16, 78) construction
  line L134 (12, 78) -> (16, 78)
  line L135 (12, 76) -> (12, 78)
  line L136 (16, 78) -> (16, 70) construction
  line L137 (12, 72) -> (8, 72)
  line L138 (12, 70) -> (16, 78) construction
  line L139 (12, 70) -> (12, 78) construction
  line L140 (16, 70) -> (12, 78) construction
  line L141 (8, 76) -> (12, 76)
  line L142 (8, 72) -> (8, 76)
  line L143 (25, 72) -> (8, 72) construction
  line L144 (8, 76) -> (25, 76) construction
  line L145 (8, 74) -> (25, 74) construction
  line L146 (16, 76) -> (25, 76)
  line L147 (25, 72) -> (25, 76)
  line L148 (25, 76) -> (25, 72) construction
  line L149 (8, 72) -> (8, 76) construction
  line L150 (16, 116) -> (16, 114)
  line L151 (16, 114) -> (12, 114)
  line L152 (12, 114) -> (12, 116)
  line L153 (16, 114) -> (12, 114) construction
  line L154 (16, 122) -> (16, 120)
  line L155 (25, 116) -> (16, 116)
  line L156 (12, 122) -> (16, 122) construction
  line L157 (12, 122) -> (16, 122)
  line L158 (12, 120) -> (12, 122)
  line L159 (16, 122) -> (16, 114) construction
  line L160 (12, 116) -> (8, 116)
  line L161 (12, 114) -> (16, 122) construction
  line L162 (12, 114) -> (12, 122) construction
  line L163 (16, 114) -> (12, 122) construction
  line L164 (8, 120) -> (12, 120)
  line L165 (8, 116) -> (8, 120)
  line L166 (25, 116) -> (8, 116) construction
  line L167 (8, 120) -> (25, 120) construction
  line L168 (8, 118) -> (25, 118) construction
  line L169 (16, 120) -> (25, 120)
  line L170 (25, 116) -> (25, 120)
  line L171 (25, 120) -> (25, 116) construction
  line L172 (8, 116) -> (8, 120) construction
  point P0 (0, 0)
  point P1 (14, -118)
  point P2 (14, -74)
  point P3 (14, 74)
  point P4 (14, 118)
  dimension "d82" = 17
  dimension "d83" = 4
  dimension "d84" = 4
  dimension "d85" = 8
  dimension "d86" = 10
  dimension "d87" = 17
  dimension "d88" = 4
  dimension "d89" = 4
  dimension "d90" = 8
  dimension "d91" = 17
  dimension "d92" = 4
  dimension "d93" = 4
  dimension "d94" = 8
  dimension "d95" = 17
  dimension "d96" = 4
  dimension "d97" = 4
  dimension "d98" = 8
  dimension "d99" = 10
  dimension "d100" = 10
  dimension "d101" = 10
  dimension "d112" = 0
  dimension "d113" = 0
  dimension "d114" = 4
  dimension "d115" = 4
  dimension "d116" = 0
  dimension "d117" = 4
  dimension "d118" = 0
  dimension "d119" = 4
extrude "Extrusion6" cut sketch "Sketch6" against normal blind 5
sketch "Sketch7" plane through (0, 5, 0) normal (0, 1, 0) x (1, 0, 0)
  line L0 (16, 76) -> (25, 76) construction
  line L1 (25, 76) -> (25, 86) construction
  line L2 (28.5, 86) -> (25, 86) construction
  line L3 (28.5, 106) -> (28.5, 86) construction
  line L4 (25, 106) -> (28.5, 106) construction
  line L5 (25, 106) -> (25, 116) construction
  line L6 (25, 116) -> (16, 116) construction
  line L7 (16, 116) -> (16, 114) construction
  line L8 (16, 114) -> (12, 114) construction
  line L9 (12, 114) -> (12, 116) construction
  line L10 (12, 116) -> (8, 116) construction
  line L11 (8, 116) -> (8, 120) construction
  line L12 (8, 120) -> (12, 120) construction
  line L13 (12, 120) -> (12, 122) construction
  line L14 (12, 122) -> (16, 122) construction
  line L15 (16, 122) -> (16, 120) construction
  line L16 (16, 120) -> (25, 120) construction
  line L17 (25, 120) -> (25, 130) construction
  line L18 (25, 130) -> (-30, 130) construction
  line L19 (-30, 130) -> (-30, 105) construction
  line L20 (-30, 105) -> (-25, 105) construction
  line L21 (-25, 105) -> (-25, 45) construction
  line L22 (-25, 45) -> (-30, 45) construction
  line L23 (-30, 45) -> (-30, -45) construction
  line L24 (-30, -45) -> (-25, -45) construction
  line L25 (-25, -45) -> (-25, -105) construction
  line L26 (-25, -105) -> (-30, -105) construction
  line L27 (-30, -105) -> (-30, -130) construction
  line L28 (-30, -130) -> (25, -130) construction
  line L29 (25, -130) -> (25, -120) construction
  line L30 (25, -120) -> (16, -120) construction
  line L31 (16, -120) -> (16, -122) construction
  line L32 (16, -122) -> (12, -122) construction
  line L33 (12, -122) -> (12, -120) construction
  line L34 (12, -120) -> (8, -120) construction
  line L35 (8, -120) -> (8, -116) construction
  line L36 (8, -116) -> (12, -116) construction
  line L37 (12, -116) -> (12, -114) construction
  line L38 (12, -114) -> (16, -114) construction
  line L39 (16, -114) -> (16, -116) construction
  line L40 (16, -116) -> (25, -116) construction
  line L41 (25, -116) -> (25, -106) construction
  line L42 (25, -106) -> (28.5, -106) construction
  line L43 (28.5, -106) -> (28.5, -86) construction
  line L44 (28.5, -86) -> (25, -86) construction
  line L45 (25, -86) -> (25, -76) construction
  line L46 (25, -76) -> (16, -76) construction
  line L47 (16, -76) -> (16, -78) construction
  line L48 (16, -78) -> (12, -78) construction
  line L49 (12, -78) -> (12, -76) construction
  line L50 (12, -76) -> (8, -76) construction
  line L51 (8, -76) -> (8, -72) construction
  line L52 (8, -72) -> (12, -72) construction
  line L53 (12, -72) -> (12, -70) construction
  line L54 (12, -70) -> (16, -70) construction
  line L55 (16, -70) -> (16, -72) construction
  line L56 (16, -72) -> (25, -72) construction
  line L57 (25, -72) -> (25, -30) construction
  line L58 (25, -30) -> (28.5, -30) construction
  line L59 (28.5, -30) -> (28.5, 30) construction
  line L60 (28.5, 30) -> (25, 30) construction
  line L61 (25, 30) -> (25, 72) construction
  line L62 (25, 72) -> (16, 72) construction
  line L63 (16, 72) -> (16, 70) construction
  line L64 (16, 70) -> (12, 70) construction
  line L65 (12, 70) -> (12, 72) construction
  line L66 (12, 72) -> (8, 72) construction
  line L67 (8, 72) -> (8, 76) construction
  line L68 (8, 76) -> (12, 76) construction
  line L69 (12, 76) -> (12, 78) construction
  line L70 (12, 78) -> (16, 78) construction
  line L71 (16, 78) -> (16, 76) construction
  line L72 (-12.5, 35) -> (-12.5, 40) construction
  line L73 (-12.5, 40) -> (12.5, 40) construction
  line L74 (12.5, 40) -> (12.5, 35) construction
  line L75 (12.5, 35) -> (-12.5, 35) construction
  line L76 (12.5, -40) -> (-12.5, -40) construction
  line L77 (-12.5, -40) -> (-12.5, -35) construction
  line L78 (-12.5, -35) -> (12.5, -35) construction
  line L79 (12.5, -35) -> (12.5, -40) construction
  circle A0 centre (-5, 15) radius 2 construction
  circle A1 centre (-5, -15) radius 2 construction
  line L80 (7.5, -95) -> (7.5, -100) construction
  line L81 (7.5, -100) -> (-7.5, -100) construction
  line L82 (-7.5, -100) -> (-7.5, -95) construction
  line L83 (-7.5, -95) -> (7.5, -95) construction
  circle A2 centre (-15.5, -97.5) radius 2 construction
  circle A3 centre (-15.5, 106.5) radius 2 construction
  circle A4 centre (15.5, 106.5) radius 2 construction
  circle A5 centre (15.5, -97.5) radius 2 construction
  line L84 (7.5, 104) -> (-7.5, 104) construction
  line L85 (-7.5, 104) -> (-7.5, 109) construction
  line L86 (-7.5, 109) -> (7.5, 109) construction
  line L87 (7.5, 109) -> (7.5, 104) construction
  line L88 (-20, -130) -> (10, -130)
  line L89 (10, -130) -> (10, -133.5)
  line L90 (10, -133.5) -> (-20, -133.5)
  line L91 (-20, -133.5) -> (-20, -130)
  line L92 (25, 130) -> (-30, 130) construction
  line L93 (-20, 130) -> (10, 130)
  line L94 (10, 130) -> (10, 133.5)
  line L95 (10, 133.5) -> (-20, 133.5)
  line L96 (-20, 133.5) -> (-20, 130)
  point P0 (0, 0)
  dimension "d104" = 30
  dimension "d105" = 3.5
  dimension "d106" = 10
  dimension "d107" = 30
  dimension "d108" = 3.5
  dimension "d109" = 10
extrude "Extrusion7" add sketch "Sketch7" against normal blind 5
properties part number "Cubierta_Rodamientos"
